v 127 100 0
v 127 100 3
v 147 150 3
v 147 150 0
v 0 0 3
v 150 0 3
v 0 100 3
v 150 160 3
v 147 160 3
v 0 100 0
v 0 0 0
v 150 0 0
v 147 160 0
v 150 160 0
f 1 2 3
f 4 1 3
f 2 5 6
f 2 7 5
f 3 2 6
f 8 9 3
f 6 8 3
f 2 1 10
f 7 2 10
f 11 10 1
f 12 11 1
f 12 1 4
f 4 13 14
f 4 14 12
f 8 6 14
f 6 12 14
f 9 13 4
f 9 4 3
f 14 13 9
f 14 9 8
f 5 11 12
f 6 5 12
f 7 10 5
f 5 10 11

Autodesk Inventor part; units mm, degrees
ref_plane "YZ Plane" through (0, 0, 0) normal (1, 0, 0) x (0, 1, 0)
ref_plane "XZ Plane" through (0, 0, 0) normal (0, 1, 0) x (-1, 0, 0)
ref_plane "XY Plane" through (0, 0, 0) normal (0, 0, 1) x (1, 0, 0)
sketch "Boceto1" plane through (0, 0, 0) normal (0, 0, 1) x (1, 0, 0)
  line L0 (0, 0) -> (150, 0)
  line L1 (150, 0) -> (150, 100)
  line L2 (150, 100) -> (0, 100)
  line L3 (0, 100) -> (0, 0)
  dimension "d0" = 150
  dimension "d1" = 100
extrude "Extrusión1" add sketch "Boceto1" along normal blind 3
sketch "Boceto2" plane through (0, 100, 0) normal (0, 1, 0) x (1, 0, 0)
  line L0 (150, 0) -> (0, 0) construction
  line L1 (0, 0) -> (0, -3) construction
  line L2 (150, -3) -> (0, -3) construction
  line L3 (150, 0) -> (150, -3) construction
  line L4 (150, 0) -> (147, 0)
  line L5 (147, 0) -> (147, -3)
  line L6 (147, -3) -> (150, -3)
  line L7 (150, -3) -> (150, 0)
  line L8 (150, 0) -> (150, -3) construction
  line L9 (150, -3) -> (0, -3) construction
  point P0 (0, 0)
  dimension "d4" = 3
  dimension "d5" = 3
extrude "Extrusión2" add sketch "Boceto2" along normal blind 60
sketch "Boceto3" plane through (0, 0, 3) normal (0, 0, 1) x (1, 0, 0)
  line L0 (0, 0) -> (150, 0) construction
  line L1 (150, 0) -> (150, 160) construction
  line L2 (147, 160) -> (150, 160) construction
  line L3 (147, 100) -> (147, 160) construction
  line L4 (147, 100) -> (0, 100) construction
  line L5 (0, 100) -> (0, 0) construction
  line L6 (147, 100) -> (127, 100)
  line L7 (147, 100) -> (0, 100) construction
  line L8 (127, 100) -> (147, 150)
  line L9 (147, 100) -> (147, 160) construction
  line L10 (147, 150) -> (147, 100)
  dimension "d8" = 20
  dimension "d9" = 10
extrude "Extrusión3" add sketch "Boceto3" against normal blind 3
properties part number "Porton"
